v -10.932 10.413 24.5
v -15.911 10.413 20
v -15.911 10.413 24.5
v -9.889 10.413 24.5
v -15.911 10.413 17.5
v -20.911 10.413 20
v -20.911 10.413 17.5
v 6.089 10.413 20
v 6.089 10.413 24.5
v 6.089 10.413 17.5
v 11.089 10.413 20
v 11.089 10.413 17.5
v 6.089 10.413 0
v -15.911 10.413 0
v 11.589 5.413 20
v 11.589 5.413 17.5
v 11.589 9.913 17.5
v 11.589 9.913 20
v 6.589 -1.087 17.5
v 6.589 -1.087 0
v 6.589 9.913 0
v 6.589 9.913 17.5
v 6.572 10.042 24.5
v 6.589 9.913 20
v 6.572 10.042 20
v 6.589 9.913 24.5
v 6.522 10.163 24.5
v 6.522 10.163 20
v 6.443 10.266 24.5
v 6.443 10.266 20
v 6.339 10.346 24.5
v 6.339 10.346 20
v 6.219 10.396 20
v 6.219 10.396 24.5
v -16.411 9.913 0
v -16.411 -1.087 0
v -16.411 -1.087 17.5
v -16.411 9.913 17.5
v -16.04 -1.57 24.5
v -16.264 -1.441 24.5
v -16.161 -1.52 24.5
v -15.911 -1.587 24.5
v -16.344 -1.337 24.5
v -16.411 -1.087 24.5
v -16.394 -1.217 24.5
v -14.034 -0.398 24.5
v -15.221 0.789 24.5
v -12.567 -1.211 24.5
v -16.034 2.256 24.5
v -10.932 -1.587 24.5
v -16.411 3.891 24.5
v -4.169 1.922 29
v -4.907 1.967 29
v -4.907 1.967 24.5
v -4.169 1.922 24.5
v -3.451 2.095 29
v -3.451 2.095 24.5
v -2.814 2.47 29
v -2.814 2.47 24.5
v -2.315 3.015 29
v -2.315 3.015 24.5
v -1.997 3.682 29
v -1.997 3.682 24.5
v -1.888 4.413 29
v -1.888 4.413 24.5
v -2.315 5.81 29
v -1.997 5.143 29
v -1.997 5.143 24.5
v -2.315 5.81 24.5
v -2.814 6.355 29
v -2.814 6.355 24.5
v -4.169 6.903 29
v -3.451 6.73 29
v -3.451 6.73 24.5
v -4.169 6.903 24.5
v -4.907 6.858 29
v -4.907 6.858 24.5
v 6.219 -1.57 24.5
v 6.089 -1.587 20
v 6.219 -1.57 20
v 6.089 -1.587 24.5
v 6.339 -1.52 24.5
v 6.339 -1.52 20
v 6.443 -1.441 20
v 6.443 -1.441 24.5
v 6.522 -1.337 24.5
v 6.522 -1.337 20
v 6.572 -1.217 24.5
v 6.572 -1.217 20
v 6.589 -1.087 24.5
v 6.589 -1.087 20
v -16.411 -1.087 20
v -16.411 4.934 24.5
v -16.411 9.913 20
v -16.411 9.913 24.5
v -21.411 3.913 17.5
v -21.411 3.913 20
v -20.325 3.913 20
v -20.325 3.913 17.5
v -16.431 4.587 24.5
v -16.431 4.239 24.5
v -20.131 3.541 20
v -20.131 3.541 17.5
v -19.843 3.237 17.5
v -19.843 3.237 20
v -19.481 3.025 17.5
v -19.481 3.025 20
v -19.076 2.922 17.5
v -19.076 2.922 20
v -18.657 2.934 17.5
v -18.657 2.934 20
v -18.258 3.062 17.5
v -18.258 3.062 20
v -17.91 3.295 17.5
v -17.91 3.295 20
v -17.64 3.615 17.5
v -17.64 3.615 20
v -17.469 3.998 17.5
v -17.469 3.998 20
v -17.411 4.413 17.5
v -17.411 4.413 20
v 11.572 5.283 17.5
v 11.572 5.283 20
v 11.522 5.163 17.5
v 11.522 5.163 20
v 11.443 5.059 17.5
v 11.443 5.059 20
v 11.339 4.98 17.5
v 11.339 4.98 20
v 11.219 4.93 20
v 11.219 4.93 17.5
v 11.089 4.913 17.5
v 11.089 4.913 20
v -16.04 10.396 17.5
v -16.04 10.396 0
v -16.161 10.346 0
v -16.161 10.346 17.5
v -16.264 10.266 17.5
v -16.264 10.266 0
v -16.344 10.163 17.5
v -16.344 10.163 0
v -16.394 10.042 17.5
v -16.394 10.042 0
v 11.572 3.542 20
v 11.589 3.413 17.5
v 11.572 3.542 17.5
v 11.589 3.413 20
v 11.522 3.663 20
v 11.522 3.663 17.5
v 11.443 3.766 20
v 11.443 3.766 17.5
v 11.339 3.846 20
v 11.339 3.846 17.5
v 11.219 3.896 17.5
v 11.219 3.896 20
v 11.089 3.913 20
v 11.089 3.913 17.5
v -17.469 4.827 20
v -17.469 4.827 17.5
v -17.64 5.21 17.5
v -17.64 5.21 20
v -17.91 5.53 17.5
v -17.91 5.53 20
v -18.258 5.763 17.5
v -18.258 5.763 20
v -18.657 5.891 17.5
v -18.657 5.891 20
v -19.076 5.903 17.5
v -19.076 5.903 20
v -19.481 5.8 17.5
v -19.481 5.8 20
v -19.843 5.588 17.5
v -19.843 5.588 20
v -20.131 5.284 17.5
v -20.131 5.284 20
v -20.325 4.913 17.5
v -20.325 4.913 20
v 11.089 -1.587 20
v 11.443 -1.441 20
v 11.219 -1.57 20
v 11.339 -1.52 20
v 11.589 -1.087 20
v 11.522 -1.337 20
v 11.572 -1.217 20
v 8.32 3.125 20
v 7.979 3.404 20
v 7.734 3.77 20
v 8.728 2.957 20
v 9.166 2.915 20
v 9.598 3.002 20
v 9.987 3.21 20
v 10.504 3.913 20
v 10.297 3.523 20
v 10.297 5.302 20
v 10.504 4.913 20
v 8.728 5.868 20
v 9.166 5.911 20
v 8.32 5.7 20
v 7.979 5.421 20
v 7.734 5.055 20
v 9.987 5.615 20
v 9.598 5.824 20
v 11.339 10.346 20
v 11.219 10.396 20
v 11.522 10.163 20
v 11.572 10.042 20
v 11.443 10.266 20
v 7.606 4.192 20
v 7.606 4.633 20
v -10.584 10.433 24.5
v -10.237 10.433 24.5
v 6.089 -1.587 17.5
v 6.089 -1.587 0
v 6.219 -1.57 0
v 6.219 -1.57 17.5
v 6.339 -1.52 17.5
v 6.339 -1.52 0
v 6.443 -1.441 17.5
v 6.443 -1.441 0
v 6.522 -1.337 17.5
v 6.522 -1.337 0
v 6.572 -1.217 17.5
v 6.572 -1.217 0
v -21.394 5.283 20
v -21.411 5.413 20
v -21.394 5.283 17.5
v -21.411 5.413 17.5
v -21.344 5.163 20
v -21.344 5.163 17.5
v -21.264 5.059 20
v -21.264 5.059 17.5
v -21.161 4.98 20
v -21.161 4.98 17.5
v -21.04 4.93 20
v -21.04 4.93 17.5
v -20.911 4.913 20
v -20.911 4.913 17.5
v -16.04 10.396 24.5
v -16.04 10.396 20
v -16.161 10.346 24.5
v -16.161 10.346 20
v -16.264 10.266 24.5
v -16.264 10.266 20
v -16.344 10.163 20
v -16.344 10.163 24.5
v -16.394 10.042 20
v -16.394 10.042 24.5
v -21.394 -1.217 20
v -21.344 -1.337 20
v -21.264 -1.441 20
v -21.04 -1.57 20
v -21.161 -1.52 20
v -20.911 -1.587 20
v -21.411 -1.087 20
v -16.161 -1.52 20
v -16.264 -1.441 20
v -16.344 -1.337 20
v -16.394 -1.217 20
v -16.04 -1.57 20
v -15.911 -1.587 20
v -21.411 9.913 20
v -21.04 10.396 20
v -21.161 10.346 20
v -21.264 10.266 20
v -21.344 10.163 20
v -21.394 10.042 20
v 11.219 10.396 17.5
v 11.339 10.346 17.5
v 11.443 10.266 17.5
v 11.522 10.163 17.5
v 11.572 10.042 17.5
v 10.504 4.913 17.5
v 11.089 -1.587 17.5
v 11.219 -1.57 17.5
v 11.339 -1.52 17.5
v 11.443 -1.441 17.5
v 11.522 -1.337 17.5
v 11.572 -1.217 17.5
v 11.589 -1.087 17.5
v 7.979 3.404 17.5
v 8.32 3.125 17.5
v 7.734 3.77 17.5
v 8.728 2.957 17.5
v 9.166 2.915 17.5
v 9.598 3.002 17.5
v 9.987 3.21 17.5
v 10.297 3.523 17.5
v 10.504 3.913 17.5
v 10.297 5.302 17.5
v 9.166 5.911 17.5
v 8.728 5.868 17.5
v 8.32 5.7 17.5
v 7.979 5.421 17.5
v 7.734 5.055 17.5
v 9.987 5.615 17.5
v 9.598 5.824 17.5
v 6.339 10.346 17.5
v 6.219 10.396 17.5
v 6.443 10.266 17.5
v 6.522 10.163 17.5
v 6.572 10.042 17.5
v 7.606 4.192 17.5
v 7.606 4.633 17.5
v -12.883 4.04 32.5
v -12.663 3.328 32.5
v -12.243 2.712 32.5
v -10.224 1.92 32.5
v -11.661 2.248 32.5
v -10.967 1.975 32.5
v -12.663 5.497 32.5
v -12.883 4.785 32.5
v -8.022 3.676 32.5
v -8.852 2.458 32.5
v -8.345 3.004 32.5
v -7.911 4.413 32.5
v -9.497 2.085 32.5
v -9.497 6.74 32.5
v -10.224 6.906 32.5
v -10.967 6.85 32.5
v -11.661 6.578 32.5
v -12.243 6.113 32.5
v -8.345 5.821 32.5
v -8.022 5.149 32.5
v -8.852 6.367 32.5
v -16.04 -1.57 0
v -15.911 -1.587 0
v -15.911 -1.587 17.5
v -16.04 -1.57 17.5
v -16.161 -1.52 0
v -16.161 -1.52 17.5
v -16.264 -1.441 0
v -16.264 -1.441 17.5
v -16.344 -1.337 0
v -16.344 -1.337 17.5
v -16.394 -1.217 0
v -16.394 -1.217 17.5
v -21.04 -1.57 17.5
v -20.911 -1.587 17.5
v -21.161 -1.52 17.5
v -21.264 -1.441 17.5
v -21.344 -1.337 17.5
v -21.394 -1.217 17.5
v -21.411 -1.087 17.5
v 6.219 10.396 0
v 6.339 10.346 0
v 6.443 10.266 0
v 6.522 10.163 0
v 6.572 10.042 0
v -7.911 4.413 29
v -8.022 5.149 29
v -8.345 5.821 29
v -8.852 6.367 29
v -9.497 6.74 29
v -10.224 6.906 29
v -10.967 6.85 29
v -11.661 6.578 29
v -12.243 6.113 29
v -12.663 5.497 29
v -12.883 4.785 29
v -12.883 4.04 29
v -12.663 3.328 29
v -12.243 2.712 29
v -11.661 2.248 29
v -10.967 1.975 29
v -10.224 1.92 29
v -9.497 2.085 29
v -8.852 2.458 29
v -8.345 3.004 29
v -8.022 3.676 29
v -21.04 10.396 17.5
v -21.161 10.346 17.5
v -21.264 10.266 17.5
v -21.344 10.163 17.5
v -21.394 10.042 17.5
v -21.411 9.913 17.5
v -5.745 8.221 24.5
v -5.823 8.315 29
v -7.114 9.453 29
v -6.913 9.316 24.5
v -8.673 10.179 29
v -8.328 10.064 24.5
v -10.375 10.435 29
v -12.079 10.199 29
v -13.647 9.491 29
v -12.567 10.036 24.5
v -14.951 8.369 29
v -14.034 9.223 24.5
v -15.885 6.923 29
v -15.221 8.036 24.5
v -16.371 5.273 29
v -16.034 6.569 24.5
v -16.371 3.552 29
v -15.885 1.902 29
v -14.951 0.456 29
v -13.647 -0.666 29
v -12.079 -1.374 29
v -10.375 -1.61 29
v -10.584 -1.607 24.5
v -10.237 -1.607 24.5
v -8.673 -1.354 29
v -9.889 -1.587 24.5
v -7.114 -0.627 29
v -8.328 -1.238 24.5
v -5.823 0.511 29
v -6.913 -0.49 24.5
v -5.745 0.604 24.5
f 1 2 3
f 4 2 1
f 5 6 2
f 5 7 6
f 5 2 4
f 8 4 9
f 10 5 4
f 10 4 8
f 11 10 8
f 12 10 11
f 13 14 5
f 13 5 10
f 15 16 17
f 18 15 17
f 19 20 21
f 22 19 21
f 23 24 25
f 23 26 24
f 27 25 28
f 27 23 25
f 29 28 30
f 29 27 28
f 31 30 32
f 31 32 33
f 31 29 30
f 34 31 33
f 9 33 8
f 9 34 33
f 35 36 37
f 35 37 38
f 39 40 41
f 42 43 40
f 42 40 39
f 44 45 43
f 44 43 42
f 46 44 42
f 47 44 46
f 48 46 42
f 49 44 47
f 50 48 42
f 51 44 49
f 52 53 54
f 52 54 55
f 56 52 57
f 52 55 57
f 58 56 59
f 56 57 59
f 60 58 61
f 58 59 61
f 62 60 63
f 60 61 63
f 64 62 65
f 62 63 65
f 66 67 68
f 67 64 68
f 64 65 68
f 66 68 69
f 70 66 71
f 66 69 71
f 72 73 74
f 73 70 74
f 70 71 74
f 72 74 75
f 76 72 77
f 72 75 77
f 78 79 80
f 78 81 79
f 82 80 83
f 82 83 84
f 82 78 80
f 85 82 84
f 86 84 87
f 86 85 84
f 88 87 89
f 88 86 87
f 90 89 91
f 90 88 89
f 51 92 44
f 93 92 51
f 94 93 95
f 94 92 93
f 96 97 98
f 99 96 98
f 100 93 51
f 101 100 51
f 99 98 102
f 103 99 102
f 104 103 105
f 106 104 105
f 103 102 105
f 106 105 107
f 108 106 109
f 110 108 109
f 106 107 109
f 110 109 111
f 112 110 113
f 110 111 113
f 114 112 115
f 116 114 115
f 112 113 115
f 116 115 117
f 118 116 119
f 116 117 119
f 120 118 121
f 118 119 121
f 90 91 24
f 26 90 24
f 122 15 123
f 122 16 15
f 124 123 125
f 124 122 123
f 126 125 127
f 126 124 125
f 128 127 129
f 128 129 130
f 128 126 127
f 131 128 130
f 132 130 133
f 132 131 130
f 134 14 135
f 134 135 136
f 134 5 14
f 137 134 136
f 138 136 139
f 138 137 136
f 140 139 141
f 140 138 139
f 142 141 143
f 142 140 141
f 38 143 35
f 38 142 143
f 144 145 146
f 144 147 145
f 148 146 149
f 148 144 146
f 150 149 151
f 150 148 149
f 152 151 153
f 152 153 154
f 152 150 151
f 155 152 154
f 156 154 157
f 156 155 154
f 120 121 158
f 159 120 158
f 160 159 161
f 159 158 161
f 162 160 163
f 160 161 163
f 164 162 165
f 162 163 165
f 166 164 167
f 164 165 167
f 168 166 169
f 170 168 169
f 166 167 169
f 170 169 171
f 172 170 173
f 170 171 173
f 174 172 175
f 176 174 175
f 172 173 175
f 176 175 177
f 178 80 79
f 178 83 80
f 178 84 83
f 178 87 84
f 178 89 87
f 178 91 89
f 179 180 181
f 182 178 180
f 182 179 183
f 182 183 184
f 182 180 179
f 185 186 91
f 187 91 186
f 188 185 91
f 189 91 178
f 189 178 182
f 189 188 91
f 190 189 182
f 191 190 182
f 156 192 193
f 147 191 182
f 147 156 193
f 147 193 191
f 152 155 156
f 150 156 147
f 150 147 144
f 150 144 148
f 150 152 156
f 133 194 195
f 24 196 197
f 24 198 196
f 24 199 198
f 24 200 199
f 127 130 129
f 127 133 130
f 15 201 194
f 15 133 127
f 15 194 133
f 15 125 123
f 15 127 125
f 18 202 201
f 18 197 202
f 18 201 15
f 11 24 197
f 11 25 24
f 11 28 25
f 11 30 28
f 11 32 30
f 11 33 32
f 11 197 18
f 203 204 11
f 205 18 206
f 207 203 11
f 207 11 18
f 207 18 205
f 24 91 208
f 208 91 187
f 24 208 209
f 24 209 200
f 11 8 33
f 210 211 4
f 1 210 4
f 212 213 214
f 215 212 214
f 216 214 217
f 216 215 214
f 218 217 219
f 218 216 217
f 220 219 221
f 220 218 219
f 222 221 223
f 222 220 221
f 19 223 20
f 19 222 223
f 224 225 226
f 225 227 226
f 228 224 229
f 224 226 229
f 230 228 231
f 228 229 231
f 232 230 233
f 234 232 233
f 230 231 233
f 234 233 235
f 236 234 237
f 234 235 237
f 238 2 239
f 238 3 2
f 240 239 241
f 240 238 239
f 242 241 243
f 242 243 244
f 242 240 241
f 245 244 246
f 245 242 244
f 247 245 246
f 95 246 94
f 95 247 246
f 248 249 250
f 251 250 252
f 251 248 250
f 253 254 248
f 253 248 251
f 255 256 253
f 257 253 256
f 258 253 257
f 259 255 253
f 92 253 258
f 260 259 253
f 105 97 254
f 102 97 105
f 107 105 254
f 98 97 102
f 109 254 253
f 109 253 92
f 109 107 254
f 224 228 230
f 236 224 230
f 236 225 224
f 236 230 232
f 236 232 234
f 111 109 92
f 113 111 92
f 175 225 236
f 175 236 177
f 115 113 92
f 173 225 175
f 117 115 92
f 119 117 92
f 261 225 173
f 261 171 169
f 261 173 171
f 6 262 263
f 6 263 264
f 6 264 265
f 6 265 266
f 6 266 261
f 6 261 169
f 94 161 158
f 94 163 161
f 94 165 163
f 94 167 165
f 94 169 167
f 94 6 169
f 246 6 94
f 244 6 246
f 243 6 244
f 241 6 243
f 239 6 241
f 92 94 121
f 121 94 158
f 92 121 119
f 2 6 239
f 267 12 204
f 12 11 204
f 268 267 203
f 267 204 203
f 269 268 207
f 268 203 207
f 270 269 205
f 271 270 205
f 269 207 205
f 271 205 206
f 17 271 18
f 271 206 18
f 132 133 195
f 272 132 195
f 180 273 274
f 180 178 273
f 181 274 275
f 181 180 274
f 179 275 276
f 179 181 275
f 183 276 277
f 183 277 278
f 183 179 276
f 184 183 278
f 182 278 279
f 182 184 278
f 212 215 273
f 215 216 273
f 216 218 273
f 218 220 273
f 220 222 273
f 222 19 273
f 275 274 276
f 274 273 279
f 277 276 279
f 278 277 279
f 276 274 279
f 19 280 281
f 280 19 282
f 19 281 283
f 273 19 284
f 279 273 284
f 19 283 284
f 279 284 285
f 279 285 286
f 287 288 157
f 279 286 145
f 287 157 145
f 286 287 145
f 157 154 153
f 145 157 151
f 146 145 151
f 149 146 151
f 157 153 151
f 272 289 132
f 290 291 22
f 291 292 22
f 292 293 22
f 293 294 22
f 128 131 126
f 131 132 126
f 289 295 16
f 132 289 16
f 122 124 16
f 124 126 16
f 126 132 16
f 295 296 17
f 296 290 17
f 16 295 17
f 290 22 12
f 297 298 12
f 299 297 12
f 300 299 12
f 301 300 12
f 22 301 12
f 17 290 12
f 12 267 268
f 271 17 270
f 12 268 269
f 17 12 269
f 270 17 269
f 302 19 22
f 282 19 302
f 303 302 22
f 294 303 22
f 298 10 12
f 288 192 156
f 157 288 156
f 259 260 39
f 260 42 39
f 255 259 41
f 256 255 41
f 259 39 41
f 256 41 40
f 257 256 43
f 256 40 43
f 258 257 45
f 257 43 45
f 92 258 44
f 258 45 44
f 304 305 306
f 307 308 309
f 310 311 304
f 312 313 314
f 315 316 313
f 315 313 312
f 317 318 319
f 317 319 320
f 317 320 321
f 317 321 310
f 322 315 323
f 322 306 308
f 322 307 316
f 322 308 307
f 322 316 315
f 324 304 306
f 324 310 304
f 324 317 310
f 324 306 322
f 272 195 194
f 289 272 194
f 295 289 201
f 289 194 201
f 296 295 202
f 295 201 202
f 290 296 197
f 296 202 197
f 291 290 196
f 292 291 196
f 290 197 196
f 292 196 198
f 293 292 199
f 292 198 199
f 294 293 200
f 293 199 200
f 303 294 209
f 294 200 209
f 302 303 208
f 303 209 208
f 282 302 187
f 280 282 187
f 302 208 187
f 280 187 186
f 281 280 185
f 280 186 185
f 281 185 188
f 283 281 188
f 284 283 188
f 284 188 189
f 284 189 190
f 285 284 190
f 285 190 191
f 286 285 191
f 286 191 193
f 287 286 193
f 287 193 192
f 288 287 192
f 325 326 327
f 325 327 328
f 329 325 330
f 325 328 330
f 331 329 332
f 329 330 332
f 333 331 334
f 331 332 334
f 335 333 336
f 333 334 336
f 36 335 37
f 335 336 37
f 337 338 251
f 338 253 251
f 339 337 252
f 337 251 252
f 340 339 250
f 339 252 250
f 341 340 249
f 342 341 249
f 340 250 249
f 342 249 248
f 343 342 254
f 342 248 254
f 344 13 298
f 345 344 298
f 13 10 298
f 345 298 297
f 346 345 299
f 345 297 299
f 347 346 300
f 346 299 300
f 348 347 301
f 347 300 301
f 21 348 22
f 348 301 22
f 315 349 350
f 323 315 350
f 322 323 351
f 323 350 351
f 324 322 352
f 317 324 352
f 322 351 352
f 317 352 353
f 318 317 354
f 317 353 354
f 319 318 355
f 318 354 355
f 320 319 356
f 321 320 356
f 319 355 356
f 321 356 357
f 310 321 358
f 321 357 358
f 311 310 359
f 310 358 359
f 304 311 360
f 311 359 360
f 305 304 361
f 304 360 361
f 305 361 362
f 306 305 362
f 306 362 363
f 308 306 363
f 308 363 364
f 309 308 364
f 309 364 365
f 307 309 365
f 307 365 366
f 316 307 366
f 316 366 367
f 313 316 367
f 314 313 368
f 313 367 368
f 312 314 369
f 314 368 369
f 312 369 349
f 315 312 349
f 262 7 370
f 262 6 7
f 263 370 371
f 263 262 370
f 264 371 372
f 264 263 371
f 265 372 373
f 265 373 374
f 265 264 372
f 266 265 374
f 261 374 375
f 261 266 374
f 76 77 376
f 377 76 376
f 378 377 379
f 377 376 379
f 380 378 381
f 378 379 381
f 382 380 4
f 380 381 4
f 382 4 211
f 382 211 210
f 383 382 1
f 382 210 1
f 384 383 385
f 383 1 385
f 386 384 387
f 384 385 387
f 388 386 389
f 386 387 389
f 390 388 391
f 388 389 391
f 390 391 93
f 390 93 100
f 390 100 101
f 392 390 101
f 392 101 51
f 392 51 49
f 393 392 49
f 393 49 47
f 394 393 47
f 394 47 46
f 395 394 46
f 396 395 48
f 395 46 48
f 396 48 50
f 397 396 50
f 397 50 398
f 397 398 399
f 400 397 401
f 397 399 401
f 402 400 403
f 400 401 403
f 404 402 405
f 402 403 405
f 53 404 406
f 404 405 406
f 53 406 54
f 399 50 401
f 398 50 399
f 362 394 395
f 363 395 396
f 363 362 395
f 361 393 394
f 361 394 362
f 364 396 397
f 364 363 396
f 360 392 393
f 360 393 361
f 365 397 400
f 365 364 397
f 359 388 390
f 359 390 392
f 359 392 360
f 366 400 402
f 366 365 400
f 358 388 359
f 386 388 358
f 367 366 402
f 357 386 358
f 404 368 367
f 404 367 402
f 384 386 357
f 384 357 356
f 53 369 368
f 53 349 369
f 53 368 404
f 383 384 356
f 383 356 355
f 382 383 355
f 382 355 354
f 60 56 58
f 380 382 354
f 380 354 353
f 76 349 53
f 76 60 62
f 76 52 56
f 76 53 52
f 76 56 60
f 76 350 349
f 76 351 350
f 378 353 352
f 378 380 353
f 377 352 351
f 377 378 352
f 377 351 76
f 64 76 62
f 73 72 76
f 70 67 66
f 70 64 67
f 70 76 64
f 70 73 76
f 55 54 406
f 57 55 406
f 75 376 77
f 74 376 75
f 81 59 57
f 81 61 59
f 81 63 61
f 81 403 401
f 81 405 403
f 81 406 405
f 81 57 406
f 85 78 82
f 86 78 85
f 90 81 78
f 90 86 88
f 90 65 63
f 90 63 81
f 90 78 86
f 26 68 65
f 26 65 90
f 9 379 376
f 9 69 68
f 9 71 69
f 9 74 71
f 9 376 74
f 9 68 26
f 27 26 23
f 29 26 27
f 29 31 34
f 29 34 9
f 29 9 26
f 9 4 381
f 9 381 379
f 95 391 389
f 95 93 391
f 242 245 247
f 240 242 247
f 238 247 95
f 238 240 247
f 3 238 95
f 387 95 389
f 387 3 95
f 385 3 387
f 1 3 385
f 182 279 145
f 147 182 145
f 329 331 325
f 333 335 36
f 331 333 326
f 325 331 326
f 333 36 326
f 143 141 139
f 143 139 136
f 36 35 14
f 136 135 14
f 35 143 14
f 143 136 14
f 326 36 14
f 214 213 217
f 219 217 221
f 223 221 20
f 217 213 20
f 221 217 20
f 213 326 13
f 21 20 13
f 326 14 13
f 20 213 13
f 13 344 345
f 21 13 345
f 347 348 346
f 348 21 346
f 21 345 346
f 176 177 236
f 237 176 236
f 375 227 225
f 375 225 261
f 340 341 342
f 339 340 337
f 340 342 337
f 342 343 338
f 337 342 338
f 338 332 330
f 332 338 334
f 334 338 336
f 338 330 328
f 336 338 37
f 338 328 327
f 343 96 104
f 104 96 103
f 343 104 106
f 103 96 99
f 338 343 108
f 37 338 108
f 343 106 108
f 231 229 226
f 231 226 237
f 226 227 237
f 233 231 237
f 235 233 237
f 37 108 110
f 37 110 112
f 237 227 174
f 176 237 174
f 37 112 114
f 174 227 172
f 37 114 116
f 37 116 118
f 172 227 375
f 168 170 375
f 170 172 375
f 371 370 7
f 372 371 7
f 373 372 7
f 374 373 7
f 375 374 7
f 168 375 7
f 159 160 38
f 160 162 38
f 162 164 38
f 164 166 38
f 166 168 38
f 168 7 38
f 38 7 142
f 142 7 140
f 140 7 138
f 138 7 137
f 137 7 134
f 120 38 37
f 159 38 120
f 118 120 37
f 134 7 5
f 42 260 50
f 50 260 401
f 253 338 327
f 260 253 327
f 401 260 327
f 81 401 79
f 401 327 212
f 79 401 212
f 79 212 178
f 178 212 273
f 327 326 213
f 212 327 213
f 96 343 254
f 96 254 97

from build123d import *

# Parameters (mm, degrees)
ESQUISSE1_W             = 23
ESQUISSE1_H             = 12
BOSS_EXTRU_1_DEPTH      = 17.5
ESQUISSE2_W             = 33
ESQUISSE2_H             = 12
BOSS_EXTRU_2_DEPTH      = 2.5
ESQUISSE3_W             = 23
ESQUISSE3_H             = 12
BOSS_EXTRU_3_DEPTH      = 4.5
ESQUISSE4_R             = 6.022589187
BOSS_EXTRU_4_DEPTH      = 4.5
ESQUISSE5_R             = 2.5
BOSS_EXTRU_5_DEPTH      = 4.5
ESQUISSE6_R             = 2.5
BOSS_EXTRU_6_DEPTH      = 3.5
ENL_V_MAT_EXTRU_3_DEPTH = 21
CONG_2_R                = 0.5


with BuildPart() as part:
    # Esquisse1 → Boss.-Extru.1 (new body)
    with BuildSketch(Plane.XY):
        with Locations((-4.910575451, 4.41260745)):
            Rectangle(ESQUISSE1_W, ESQUISSE1_H)
    extrude(amount=BOSS_EXTRU_1_DEPTH)

    # Esquisse2 → Boss.-Extru.2 (add)
    with BuildSketch(Plane.XY.offset(17.5)):
        with Locations((-4.910575451, 4.41260745)):
            Rectangle(ESQUISSE2_W, ESQUISSE2_H)
    extrude(amount=BOSS_EXTRU_2_DEPTH)

    # Esquisse3 → Boss.-Extru.3 (add)
    with BuildSketch(Plane.XY.offset(20)):
        with Locations((-4.910575451, 4.41260745)):
            Rectangle(ESQUISSE3_W, ESQUISSE3_H)
    extrude(amount=BOSS_EXTRU_3_DEPTH)

    # Esquisse4 → Boss.-Extru.4 (add)
    with BuildSketch(Plane.XY.offset(24.5)):
        with Locations((-10.410575451, 4.41260745)):
            Circle(ESQUISSE4_R)
    extrude(amount=BOSS_EXTRU_4_DEPTH)

    # Esquisse5 → Boss.-Extru.5 (add)
    with BuildSketch(Plane.XY.offset(24.5)):
        with Locations((-4.387986264, 4.41260745)):
            Circle(ESQUISSE5_R)
    extrude(amount=BOSS_EXTRU_5_DEPTH)

    # Esquisse6 → Boss.-Extru.6 (add)
    with BuildSketch(Plane.XY.offset(29)):
        with Locations((-10.410575451, 4.41260745)):
            Circle(ESQUISSE6_R)
    extrude(amount=BOSS_EXTRU_6_DEPTH)

    # Esquisse7 → Enlèv. mat.-Extru.3 (cut, through all)
    with BuildSketch(Plane.XY.offset(20)):
        with BuildLine():
            ThreePointArc((-20.324789014, 4.91260745), (-20.410575451, 4.41260745), (-20.324789014, 3.91260745))
            Line((-20.324789014, 3.91260745), (-20.324789014, 4.91260745))
        make_face()
        with BuildLine():
            Line((-20.324789014, 4.91260745), (-20.324789014, 3.91260745))
            ThreePointArc((-20.324789014, 3.91260745), (-18.656922483, 2.93420961), (-17.410575451, 4.41260745))
            ThreePointArc((-17.410575451, 4.41260745), (-18.656922483, 5.891005289), (-20.324789014, 4.91260745))
        make_face()
        with BuildLine():
            Line((-21.410575451, 4.91260745), (-21.410575451, 3.91260745))
            Line((-21.410575451, 3.91260745), (-20.324789014, 3.91260745))
            ThreePointArc((-20.324789014, 3.91260745), (-20.410575451, 4.41260745), (-20.324789014, 4.91260745))
            Line((-20.324789014, 4.91260745), (-21.410575451, 4.91260745))
        make_face()
        with BuildLine():
            ThreePointArc((10.589424549, 4.41260745), (10.567822388, 4.666260418), (10.503638111, 4.91260745))
            Line((10.503638111, 4.91260745), (10.503638111, 3.91260745))
            ThreePointArc((10.503638111, 3.91260745), (10.567822388, 4.158954482), (10.589424549, 4.41260745))
        make_face()
        with BuildLine():
            Line((10.503638111, 3.91260745), (10.503638111, 4.91260745))
            ThreePointArc((10.503638111, 4.91260745), (7.589424549, 4.41260745), (10.503638111, 3.91260745))
        make_face()
        with BuildLine():
            Line((12.675210986, 3.91260745), (12.675210986, 4.91260745))
            Line((12.675210986, 4.91260745), (10.503638111, 4.91260745))
            ThreePointArc((10.503638111, 4.91260745), (10.567822388, 4.666260418), (10.589424549, 4.41260745))
            ThreePointArc((10.589424549, 4.41260745), (10.567822388, 4.158954482), (10.503638111, 3.91260745))
            Line((10.503638111, 3.91260745), (12.675210986, 3.91260745))
        make_face()
    extrude(amount=-ENL_V_MAT_EXTRU_3_DEPTH, mode=Mode.SUBTRACT)

    # Congé2
    cong_2_edges = [part.edges().sort_by_distance(p)[0] for p in [
        (-21.410575451, 10.41260745, 18.75),
        (-21.410575451, -1.58739255, 18.75),
        (11.589424549, -1.58739255, 18.75),
        (11.589424549, 10.41260745, 18.75),
        (-16.410575451, 10.41260745, 22.25),
        (-16.410575451, -1.58739255, 22.25),
        (6.589424549, -1.58739255, 22.25),
        (6.589424549, 10.41260745, 22.25),
        (-21.410575451, 4.91260745, 18.75),
        (-16.410575451, 10.41260745, 8.75),
        (6.589424549, 10.41260745, 8.75),
        (6.589424549, -1.58739255, 8.75),
        (-16.410575451, -1.58739255, 8.75),
        (11.589424549, 4.91260745, 18.75),
        (11.589424549, 3.91260745, 18.75),
    ]]
    fillet(cong_2_edges, radius=CONG_2_R)


solid = part.part
